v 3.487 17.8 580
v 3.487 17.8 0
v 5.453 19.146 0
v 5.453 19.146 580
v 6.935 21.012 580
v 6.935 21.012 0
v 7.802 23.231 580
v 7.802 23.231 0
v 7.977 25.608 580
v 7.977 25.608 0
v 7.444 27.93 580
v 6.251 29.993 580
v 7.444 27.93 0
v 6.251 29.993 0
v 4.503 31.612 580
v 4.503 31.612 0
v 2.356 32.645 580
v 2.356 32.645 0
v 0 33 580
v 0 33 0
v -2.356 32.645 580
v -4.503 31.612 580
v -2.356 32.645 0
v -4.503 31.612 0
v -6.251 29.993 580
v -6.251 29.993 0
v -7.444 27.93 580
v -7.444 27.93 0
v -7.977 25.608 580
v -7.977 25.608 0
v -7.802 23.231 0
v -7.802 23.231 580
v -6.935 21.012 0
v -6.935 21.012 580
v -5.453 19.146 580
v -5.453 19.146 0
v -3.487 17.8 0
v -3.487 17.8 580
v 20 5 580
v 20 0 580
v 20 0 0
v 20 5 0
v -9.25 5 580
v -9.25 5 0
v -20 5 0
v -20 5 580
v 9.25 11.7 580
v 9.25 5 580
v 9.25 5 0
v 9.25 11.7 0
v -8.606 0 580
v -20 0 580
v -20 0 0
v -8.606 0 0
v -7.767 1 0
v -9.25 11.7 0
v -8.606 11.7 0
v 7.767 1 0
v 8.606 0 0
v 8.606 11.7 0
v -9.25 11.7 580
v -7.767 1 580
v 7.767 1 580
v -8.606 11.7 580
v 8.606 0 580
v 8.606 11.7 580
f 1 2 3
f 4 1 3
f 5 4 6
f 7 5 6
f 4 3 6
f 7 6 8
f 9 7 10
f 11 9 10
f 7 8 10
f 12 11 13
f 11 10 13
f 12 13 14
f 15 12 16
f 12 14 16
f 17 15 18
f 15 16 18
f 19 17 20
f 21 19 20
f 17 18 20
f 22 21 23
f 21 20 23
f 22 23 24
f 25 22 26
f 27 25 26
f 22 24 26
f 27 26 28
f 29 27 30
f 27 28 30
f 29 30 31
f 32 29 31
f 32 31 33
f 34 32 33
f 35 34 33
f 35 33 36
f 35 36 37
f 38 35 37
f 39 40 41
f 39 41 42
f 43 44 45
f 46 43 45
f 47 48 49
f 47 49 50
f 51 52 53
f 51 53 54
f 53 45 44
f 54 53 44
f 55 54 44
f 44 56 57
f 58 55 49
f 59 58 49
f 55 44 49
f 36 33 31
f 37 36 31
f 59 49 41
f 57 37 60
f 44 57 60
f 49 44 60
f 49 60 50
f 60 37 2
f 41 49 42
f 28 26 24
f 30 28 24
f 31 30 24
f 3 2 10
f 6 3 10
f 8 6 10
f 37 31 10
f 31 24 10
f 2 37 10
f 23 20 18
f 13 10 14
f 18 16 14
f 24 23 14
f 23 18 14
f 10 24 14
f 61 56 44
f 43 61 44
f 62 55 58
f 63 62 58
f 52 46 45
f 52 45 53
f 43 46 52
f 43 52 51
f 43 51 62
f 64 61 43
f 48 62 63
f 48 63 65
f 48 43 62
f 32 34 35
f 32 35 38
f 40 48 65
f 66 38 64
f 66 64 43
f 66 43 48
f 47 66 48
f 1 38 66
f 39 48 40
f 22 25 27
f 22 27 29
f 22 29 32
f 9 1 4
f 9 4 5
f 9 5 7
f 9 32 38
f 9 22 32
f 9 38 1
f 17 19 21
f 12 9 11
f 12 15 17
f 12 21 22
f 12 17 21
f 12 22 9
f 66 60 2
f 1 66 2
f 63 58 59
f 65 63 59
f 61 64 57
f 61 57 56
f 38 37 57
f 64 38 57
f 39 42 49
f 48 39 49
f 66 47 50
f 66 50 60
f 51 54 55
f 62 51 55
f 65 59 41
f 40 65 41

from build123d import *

# Parameters (mm, degrees)
DODANIE_WYCI_GNI_CIE1_DEPTH = 580


with BuildPart() as part:
    # Szkic1 → Dodanie-wyciągnięcie1 (new body)
    with BuildSketch(Plane.XY):
        with BuildLine():
            Line((-3.487119155, 17.8), (-8.605626905, 11.7))
            Line((-8.605626905, 11.7), (-9.25, 11.7))
            Line((-9.25, 11.7), (-9.25, 5))
            Line((-9.25, 5), (-20, 5))
            Line((-20, 5), (-20, 0))
            Line((-20, 0), (-8.605626905, 0))
            Line((-8.605626905, 0), (-7.766527274, 1))
            Line((-7.766527274, 1), (7.766527274, 1))
            Line((7.766527274, 1), (8.605626905, 0))
            Line((8.605626905, 0), (20, 0))
            Line((20, 0), (20, 5))
            Line((20, 5), (9.25, 5))
            Line((9.25, 5), (9.25, 11.7))
            Line((9.25, 11.7), (8.605626905, 11.7))
            Line((8.605626905, 11.7), (3.487119155, 17.8))
            ThreePointArc((3.487119155, 17.8), (0, 33), (-3.487119155, 17.8))
        make_face()
    extrude(amount=DODANIE_WYCI_GNI_CIE1_DEPTH)


solid = part.part
